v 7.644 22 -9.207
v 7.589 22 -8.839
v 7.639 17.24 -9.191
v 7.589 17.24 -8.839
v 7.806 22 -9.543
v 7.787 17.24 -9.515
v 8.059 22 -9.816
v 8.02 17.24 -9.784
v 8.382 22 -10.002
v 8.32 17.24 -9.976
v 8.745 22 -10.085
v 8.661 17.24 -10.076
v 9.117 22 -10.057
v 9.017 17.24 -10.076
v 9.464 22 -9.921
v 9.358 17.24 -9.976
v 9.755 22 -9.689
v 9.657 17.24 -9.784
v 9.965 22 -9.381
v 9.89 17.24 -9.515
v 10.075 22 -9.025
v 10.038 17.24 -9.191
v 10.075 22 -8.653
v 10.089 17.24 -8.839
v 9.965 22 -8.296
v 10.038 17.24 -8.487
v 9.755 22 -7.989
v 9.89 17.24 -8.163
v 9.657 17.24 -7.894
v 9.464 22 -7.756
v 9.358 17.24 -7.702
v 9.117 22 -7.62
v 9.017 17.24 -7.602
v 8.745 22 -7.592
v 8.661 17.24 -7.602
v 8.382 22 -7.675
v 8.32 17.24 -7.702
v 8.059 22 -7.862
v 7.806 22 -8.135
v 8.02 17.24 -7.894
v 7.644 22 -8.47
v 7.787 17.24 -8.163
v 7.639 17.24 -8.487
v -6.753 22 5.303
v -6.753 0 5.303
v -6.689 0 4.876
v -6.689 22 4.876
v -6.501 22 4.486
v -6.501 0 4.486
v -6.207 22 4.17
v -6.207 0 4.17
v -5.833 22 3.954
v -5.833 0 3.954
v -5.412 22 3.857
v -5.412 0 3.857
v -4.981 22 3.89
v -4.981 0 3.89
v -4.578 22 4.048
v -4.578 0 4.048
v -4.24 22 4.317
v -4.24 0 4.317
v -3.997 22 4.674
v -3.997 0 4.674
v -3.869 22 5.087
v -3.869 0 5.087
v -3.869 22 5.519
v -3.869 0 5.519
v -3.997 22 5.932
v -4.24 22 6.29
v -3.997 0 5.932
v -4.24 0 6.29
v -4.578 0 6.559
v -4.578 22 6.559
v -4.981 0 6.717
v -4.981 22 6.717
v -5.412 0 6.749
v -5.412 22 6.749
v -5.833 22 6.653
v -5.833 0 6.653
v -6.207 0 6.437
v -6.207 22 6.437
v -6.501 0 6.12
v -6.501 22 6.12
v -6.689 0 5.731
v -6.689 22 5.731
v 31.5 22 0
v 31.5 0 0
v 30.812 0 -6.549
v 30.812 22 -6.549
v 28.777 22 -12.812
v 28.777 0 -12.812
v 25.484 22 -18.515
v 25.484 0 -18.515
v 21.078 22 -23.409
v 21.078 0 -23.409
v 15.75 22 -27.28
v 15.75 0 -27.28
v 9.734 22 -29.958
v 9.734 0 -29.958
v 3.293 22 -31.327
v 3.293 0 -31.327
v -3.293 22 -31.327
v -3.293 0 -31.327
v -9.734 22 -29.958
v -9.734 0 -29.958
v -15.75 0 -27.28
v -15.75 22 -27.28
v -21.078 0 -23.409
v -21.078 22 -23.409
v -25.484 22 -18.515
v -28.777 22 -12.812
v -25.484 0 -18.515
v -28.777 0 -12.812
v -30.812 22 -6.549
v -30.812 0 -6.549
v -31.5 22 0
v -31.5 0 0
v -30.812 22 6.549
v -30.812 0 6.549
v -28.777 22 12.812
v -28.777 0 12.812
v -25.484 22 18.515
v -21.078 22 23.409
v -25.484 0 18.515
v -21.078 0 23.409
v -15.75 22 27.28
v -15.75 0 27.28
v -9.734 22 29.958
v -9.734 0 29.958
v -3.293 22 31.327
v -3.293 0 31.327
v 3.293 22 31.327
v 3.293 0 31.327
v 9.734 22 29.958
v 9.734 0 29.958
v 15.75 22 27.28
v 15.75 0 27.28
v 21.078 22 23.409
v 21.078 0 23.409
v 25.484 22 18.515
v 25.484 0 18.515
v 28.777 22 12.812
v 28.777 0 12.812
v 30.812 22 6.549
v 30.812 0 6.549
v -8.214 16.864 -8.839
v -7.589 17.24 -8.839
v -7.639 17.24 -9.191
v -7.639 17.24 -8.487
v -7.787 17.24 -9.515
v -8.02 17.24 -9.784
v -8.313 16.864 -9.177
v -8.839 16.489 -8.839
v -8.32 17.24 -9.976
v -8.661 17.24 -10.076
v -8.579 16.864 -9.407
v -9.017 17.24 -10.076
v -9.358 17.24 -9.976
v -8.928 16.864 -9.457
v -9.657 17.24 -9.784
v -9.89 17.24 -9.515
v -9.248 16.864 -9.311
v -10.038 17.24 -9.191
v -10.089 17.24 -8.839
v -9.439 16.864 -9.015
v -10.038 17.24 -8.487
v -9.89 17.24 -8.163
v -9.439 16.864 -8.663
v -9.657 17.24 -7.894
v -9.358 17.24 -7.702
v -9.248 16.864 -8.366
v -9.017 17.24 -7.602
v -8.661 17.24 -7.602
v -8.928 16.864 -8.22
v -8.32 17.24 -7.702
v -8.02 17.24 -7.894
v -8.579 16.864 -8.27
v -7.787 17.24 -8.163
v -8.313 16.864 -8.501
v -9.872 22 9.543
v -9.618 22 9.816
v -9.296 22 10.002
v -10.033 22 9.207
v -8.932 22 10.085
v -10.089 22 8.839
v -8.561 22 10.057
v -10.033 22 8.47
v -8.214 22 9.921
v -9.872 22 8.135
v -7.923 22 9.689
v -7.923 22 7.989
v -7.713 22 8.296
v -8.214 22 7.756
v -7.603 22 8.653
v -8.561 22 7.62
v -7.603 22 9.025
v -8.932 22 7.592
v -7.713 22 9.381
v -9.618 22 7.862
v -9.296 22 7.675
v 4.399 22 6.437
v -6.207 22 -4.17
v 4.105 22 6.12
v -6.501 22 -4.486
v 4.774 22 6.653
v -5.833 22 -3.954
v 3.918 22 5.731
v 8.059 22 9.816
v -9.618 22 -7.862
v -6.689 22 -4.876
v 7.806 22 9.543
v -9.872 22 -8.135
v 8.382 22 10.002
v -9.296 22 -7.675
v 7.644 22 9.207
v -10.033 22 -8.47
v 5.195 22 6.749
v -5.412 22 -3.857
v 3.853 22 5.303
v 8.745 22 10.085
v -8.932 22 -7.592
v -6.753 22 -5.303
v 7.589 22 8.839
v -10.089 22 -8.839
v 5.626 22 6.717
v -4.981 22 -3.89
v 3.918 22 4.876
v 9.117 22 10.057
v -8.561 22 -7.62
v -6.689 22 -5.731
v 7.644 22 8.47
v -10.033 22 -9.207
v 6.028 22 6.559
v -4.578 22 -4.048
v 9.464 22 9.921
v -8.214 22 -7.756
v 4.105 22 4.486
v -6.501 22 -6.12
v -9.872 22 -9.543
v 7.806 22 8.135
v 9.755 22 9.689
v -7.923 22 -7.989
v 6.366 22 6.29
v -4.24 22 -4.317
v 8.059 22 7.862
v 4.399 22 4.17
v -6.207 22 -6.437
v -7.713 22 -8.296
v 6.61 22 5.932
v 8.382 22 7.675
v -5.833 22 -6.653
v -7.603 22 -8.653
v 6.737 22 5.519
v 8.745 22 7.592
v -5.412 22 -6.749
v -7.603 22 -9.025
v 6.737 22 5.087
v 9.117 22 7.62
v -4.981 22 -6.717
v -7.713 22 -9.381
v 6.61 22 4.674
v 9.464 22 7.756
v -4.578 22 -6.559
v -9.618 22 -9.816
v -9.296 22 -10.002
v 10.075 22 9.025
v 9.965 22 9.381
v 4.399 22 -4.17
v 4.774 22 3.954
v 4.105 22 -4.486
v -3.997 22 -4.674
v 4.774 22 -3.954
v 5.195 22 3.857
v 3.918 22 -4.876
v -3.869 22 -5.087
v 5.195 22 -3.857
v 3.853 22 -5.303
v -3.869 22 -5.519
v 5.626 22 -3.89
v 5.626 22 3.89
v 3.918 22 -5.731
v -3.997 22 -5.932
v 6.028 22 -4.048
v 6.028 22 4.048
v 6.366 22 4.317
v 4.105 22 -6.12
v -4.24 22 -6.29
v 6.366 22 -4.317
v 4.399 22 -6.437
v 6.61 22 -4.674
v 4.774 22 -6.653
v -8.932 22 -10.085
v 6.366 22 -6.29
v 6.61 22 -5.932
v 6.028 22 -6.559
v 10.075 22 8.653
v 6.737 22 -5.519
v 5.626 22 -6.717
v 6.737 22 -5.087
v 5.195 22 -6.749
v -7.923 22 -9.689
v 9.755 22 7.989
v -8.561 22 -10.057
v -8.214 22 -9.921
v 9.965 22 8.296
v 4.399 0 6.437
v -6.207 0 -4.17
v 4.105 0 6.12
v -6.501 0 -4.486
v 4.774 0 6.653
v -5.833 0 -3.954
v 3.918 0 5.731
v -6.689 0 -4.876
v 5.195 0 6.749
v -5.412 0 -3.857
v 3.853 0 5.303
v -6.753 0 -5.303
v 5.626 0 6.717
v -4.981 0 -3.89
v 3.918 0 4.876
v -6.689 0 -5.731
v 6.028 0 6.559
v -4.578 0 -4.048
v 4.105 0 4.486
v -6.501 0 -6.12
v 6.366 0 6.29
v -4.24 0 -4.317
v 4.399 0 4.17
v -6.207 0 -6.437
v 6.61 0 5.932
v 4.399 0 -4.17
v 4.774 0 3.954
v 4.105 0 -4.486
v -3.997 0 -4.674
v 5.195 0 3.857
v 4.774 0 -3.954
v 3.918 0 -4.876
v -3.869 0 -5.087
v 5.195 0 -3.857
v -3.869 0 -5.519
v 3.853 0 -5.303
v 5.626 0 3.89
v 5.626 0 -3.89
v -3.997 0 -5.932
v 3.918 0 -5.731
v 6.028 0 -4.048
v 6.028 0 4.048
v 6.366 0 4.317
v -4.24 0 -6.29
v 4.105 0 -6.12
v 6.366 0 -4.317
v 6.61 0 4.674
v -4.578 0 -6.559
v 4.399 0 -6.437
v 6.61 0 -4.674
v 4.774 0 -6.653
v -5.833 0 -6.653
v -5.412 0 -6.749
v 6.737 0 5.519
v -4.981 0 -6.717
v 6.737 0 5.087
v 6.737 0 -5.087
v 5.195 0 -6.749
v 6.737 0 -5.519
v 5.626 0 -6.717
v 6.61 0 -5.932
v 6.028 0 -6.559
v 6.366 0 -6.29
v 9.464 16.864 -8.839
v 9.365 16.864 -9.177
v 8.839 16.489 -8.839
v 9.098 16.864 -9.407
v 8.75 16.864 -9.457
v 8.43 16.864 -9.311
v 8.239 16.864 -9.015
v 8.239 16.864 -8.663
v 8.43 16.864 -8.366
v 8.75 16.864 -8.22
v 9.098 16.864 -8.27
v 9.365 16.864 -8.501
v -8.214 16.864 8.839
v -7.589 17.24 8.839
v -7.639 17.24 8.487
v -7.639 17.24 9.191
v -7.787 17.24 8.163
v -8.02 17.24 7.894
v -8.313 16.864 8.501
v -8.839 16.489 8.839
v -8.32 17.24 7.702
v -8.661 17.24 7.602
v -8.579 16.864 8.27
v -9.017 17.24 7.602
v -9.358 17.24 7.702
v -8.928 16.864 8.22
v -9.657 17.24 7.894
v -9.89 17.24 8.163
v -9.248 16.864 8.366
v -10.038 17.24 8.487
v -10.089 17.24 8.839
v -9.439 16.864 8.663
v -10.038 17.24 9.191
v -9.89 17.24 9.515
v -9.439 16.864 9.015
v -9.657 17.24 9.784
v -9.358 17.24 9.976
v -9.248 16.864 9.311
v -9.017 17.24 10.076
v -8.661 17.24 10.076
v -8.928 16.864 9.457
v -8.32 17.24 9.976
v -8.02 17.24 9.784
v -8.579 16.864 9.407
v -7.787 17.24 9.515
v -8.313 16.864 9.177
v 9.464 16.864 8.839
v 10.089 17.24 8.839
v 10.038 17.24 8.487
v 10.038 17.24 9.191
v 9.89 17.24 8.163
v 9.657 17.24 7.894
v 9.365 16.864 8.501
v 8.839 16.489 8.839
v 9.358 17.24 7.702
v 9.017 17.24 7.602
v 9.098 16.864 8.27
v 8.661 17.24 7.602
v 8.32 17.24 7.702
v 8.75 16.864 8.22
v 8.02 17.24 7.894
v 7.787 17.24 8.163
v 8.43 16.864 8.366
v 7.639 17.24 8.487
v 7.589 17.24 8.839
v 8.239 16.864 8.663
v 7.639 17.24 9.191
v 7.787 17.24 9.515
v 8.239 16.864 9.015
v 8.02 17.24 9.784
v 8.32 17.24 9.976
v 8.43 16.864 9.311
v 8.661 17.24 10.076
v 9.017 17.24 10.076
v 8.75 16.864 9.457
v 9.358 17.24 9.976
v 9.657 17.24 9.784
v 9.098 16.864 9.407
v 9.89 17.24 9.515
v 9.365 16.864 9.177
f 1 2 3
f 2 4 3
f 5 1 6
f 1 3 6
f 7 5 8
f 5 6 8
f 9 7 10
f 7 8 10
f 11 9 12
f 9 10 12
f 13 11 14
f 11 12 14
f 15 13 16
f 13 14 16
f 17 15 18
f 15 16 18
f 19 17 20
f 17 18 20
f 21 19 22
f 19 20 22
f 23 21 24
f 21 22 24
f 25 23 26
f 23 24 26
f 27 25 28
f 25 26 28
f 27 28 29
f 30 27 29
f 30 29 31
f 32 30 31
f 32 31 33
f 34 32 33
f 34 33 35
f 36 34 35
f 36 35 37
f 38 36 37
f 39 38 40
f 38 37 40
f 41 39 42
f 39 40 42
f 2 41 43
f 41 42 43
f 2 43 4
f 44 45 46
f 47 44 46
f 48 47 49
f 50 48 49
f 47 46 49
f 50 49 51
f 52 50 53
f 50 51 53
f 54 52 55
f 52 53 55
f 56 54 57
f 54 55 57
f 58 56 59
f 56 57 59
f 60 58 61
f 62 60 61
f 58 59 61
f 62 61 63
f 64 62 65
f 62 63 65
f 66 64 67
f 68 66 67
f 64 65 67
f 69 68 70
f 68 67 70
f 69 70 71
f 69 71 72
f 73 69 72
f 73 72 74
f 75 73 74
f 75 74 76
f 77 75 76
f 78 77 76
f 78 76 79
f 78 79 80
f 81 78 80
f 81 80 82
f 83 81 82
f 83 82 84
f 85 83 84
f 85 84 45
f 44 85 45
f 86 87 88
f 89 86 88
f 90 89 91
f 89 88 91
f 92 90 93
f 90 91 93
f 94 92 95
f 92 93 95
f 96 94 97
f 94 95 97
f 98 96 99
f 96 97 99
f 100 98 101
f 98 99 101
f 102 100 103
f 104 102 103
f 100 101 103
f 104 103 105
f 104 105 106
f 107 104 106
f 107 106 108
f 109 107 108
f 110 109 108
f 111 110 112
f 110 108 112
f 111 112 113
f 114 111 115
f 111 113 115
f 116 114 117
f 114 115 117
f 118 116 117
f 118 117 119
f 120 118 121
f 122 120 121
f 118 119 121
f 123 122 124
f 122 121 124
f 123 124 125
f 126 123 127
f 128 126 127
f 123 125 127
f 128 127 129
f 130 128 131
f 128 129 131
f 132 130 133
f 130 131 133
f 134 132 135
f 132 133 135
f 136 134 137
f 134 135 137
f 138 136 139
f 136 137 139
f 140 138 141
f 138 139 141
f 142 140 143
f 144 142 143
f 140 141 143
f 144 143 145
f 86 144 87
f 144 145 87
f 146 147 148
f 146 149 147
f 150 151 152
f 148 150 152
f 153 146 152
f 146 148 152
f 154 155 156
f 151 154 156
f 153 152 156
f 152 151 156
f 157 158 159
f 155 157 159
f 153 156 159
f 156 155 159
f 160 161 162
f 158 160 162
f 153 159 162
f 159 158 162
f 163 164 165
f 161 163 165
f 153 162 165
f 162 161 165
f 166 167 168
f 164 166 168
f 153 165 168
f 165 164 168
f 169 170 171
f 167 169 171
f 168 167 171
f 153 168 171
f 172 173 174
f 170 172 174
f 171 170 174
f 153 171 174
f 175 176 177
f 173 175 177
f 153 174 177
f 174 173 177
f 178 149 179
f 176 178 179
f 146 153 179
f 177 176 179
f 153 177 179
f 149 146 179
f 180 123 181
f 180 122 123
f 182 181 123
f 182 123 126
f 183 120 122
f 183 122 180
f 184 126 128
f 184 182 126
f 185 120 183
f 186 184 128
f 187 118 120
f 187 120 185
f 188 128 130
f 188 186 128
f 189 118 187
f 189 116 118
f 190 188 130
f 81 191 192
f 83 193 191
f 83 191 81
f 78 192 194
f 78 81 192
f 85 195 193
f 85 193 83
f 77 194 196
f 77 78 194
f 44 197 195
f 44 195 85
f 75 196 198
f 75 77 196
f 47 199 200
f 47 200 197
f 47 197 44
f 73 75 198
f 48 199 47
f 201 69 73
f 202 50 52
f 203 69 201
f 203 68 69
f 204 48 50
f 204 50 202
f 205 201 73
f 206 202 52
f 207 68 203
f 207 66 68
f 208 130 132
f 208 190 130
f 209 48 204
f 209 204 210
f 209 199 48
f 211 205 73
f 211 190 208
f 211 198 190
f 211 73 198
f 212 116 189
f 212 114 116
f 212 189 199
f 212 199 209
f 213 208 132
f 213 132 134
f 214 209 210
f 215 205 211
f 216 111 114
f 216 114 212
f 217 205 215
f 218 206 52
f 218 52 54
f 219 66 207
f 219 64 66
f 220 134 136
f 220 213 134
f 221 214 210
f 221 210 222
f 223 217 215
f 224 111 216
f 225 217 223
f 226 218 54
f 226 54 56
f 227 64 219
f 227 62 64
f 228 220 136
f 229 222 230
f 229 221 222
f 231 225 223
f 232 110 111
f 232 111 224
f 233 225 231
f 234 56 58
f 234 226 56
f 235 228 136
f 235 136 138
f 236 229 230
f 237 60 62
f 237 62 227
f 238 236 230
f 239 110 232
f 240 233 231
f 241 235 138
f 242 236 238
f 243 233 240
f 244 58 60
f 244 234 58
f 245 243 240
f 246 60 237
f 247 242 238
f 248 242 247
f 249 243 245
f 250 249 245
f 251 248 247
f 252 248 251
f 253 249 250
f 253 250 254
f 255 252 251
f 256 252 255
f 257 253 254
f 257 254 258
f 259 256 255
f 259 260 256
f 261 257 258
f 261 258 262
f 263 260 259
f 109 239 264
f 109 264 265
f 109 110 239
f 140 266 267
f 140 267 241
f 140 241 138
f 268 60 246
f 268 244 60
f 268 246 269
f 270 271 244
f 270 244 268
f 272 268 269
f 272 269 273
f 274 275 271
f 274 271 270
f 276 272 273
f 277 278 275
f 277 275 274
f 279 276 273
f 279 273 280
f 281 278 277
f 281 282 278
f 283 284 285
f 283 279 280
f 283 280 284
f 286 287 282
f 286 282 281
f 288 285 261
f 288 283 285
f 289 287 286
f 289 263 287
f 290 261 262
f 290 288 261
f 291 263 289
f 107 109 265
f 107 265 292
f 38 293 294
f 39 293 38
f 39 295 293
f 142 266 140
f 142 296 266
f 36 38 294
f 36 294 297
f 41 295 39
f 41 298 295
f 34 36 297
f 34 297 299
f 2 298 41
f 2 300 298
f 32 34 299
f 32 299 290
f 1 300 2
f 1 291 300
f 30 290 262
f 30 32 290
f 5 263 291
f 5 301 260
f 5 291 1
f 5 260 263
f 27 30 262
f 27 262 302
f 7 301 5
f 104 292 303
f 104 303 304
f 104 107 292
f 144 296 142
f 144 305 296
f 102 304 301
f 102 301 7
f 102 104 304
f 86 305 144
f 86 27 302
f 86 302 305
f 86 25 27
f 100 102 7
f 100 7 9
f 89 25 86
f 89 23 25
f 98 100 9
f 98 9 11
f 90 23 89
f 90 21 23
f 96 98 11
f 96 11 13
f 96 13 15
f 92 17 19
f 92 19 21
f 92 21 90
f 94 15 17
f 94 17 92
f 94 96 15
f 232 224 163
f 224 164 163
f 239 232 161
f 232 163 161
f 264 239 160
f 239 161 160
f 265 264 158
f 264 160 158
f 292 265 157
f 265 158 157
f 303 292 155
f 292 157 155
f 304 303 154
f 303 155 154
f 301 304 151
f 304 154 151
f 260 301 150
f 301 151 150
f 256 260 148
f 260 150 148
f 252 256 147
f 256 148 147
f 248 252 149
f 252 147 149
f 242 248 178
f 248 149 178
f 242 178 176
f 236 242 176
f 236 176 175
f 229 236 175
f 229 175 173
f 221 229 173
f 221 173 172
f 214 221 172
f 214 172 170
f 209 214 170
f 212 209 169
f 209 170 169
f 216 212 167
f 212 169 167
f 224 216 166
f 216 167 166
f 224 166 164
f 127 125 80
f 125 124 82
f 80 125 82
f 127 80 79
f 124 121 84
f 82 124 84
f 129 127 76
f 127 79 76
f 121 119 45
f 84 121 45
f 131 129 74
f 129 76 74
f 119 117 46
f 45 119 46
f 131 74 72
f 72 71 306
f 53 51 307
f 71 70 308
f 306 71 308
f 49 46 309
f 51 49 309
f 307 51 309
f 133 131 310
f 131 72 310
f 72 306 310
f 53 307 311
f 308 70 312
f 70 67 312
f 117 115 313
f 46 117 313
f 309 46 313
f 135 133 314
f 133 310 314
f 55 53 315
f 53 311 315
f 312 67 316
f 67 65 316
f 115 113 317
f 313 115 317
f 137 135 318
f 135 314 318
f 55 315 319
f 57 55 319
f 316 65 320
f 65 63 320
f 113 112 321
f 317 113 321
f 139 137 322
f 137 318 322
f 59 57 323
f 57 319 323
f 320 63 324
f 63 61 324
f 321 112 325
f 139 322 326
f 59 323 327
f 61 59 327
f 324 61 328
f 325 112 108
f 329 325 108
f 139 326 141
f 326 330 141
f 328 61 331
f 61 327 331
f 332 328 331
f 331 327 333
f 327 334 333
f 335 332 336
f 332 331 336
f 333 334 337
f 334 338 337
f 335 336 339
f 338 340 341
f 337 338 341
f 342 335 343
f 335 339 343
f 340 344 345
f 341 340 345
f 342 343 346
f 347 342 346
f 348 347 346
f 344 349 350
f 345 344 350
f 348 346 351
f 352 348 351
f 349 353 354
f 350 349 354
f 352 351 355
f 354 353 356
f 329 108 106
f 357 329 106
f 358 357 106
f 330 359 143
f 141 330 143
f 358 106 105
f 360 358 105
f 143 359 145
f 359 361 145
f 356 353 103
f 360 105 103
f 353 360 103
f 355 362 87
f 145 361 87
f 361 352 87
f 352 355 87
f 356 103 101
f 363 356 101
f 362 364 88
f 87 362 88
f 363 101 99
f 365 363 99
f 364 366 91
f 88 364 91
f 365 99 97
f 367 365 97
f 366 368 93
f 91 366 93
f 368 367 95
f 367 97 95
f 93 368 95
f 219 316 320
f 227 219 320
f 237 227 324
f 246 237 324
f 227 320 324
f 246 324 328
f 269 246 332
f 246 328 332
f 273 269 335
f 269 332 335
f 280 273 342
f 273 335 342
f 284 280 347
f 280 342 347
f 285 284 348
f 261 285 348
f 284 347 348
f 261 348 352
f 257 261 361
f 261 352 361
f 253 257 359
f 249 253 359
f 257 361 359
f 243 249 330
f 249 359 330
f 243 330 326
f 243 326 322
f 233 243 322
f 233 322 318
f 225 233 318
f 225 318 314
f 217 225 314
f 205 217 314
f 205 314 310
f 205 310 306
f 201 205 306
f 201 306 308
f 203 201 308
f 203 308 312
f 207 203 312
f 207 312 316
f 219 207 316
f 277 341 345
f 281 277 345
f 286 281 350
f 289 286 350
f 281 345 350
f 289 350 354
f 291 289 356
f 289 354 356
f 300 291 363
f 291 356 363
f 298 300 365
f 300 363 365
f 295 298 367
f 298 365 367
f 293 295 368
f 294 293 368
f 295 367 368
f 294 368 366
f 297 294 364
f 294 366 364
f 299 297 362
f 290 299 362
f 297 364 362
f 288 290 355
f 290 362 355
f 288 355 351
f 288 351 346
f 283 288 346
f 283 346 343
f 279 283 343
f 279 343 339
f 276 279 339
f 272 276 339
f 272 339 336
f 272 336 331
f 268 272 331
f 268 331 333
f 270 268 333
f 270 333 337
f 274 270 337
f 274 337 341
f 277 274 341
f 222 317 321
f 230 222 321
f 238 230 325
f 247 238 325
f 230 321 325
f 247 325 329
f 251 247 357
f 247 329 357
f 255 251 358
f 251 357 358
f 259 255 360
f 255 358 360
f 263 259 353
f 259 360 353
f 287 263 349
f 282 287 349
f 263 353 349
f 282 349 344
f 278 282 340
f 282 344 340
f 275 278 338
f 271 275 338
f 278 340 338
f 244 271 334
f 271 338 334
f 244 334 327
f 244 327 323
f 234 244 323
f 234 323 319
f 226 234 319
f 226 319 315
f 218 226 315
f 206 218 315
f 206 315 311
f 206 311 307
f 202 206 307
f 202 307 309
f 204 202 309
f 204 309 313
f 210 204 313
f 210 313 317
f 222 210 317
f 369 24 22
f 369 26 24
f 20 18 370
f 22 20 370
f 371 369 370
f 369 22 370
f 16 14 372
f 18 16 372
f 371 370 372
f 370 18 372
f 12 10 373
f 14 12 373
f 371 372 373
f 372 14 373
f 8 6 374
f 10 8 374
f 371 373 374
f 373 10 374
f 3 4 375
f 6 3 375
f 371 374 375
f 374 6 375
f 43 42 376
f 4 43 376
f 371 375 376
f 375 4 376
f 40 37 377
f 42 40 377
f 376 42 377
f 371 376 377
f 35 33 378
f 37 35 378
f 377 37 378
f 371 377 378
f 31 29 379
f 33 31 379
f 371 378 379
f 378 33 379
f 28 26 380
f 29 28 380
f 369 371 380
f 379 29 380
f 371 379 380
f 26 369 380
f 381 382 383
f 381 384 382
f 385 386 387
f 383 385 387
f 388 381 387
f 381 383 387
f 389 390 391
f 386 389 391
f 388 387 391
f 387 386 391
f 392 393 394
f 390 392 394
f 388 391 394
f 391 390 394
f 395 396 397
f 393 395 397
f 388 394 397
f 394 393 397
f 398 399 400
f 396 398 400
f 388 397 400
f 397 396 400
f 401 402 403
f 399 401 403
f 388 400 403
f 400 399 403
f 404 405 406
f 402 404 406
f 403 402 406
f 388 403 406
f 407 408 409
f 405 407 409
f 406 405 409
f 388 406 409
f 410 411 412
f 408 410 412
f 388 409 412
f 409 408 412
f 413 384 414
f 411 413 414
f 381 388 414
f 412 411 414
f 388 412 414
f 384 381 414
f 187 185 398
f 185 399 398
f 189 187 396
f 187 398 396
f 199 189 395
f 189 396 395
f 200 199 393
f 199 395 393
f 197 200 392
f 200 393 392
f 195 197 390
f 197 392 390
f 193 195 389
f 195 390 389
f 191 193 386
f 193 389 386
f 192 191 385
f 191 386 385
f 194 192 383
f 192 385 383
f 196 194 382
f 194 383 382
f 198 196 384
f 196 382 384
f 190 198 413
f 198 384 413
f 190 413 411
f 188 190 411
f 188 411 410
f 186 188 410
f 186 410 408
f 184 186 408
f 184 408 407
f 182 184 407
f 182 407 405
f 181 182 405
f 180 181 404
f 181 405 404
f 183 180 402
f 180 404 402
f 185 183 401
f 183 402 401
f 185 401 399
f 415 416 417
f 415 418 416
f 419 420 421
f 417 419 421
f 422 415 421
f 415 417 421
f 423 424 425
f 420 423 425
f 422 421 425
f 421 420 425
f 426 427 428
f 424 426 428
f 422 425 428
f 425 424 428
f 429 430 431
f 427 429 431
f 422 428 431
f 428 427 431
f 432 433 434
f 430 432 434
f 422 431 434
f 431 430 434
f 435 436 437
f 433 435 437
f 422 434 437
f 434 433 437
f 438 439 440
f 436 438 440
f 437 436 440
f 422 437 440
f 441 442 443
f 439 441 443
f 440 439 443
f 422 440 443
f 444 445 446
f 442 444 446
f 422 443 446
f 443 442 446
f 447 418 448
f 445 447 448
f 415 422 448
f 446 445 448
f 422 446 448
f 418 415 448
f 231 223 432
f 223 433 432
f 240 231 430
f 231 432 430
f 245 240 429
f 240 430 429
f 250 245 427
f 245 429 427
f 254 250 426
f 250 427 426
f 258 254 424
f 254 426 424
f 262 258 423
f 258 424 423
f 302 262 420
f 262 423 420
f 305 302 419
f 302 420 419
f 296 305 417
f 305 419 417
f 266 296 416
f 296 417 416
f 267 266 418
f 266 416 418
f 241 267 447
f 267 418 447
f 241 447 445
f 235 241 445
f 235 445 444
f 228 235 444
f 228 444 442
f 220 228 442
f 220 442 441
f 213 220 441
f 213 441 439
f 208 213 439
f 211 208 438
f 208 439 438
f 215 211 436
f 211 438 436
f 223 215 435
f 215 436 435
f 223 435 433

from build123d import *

# Parameters (mm, degrees)
SKETCH1_R                          = 31.5
BOSS_EXTRUDE1_DEPTH                = 22
TAP_DRILL_FOR_M3X0_5_TAP1_D        = 2.5
TAP_DRILL_FOR_M3X0_5_TAP1_DEPTH    = 4.76
TAP_DRILL_FOR_M3X0_5_TAP1_TIP      = 0.751075774
TAP_DRILL_FOR_M2_5X0_45_TAP1_D     = 2.05
TAP_DRILL_FOR_M2_5X0_45_TAP1_DEPTH = 3.5
TAP_DRILL_FOR_M2_5X0_45_TAP1_TIP   = 0.615882135
M2_5_CLEARANCE_HOLE1_D             = 2.9


with BuildPart() as part:
    # Sketch1 → Boss-Extrude1 (new body)
    with BuildSketch(Plane(origin=(0, 0, 0), x_dir=(1, 0, 0), z_dir=(0, 1, 0))):
        Circle(SKETCH1_R)
    extrude(amount=BOSS_EXTRUDE1_DEPTH)

    # Tap Drill for M3x0.5 Tap1
    with Locations(Plane(origin=(0, 22, 0), x_dir=(1, 0, 0), z_dir=(0, 1, 0))):
        with Locations((8.838834765, 8.838834765), (8.838834765, -8.838834765), (-8.838834765, -8.838834765), (-8.838834765, 8.838834765)):
            Hole(TAP_DRILL_FOR_M3X0_5_TAP1_D / 2, depth=TAP_DRILL_FOR_M3X0_5_TAP1_DEPTH)
            with Locations((0, 0, -(TAP_DRILL_FOR_M3X0_5_TAP1_DEPTH + TAP_DRILL_FOR_M3X0_5_TAP1_TIP / 2))):  # 118° drill point
                Cone(0, TAP_DRILL_FOR_M3X0_5_TAP1_D / 2, TAP_DRILL_FOR_M3X0_5_TAP1_TIP, mode=Mode.SUBTRACT)

    # Tap Drill for M2.5x0.45 Tap1
    with Locations(Plane(origin=(0, 0, 0), x_dir=(-1, 0, 0), z_dir=(0, -1, 0))):
        with Locations((5.303300859, -5.303300859), (5.303300859, 5.303300859), (-5.303300859, -5.303300859), (-5.303300859, 5.303300859)):
            Hole(TAP_DRILL_FOR_M2_5X0_45_TAP1_D / 2, depth=TAP_DRILL_FOR_M2_5X0_45_TAP1_DEPTH)
            with Locations((0, 0, -(TAP_DRILL_FOR_M2_5X0_45_TAP1_DEPTH + TAP_DRILL_FOR_M2_5X0_45_TAP1_TIP / 2))):  # 118° drill point
                Cone(0, TAP_DRILL_FOR_M2_5X0_45_TAP1_D / 2, TAP_DRILL_FOR_M2_5X0_45_TAP1_TIP, mode=Mode.SUBTRACT)

    # M2.5 Clearance Hole1 (through all)
    with Locations(Plane(origin=(0, 22, 0), x_dir=(1, 0, 0), z_dir=(0, 1, 0))):
        with Locations((5.303300859, 5.303300859), (5.303300859, -5.303300859), (-5.303300859, -5.303300859), (-5.303300859, 5.303300859)):
            Hole(M2_5_CLEARANCE_HOLE1_D / 2)


solid = part.part
